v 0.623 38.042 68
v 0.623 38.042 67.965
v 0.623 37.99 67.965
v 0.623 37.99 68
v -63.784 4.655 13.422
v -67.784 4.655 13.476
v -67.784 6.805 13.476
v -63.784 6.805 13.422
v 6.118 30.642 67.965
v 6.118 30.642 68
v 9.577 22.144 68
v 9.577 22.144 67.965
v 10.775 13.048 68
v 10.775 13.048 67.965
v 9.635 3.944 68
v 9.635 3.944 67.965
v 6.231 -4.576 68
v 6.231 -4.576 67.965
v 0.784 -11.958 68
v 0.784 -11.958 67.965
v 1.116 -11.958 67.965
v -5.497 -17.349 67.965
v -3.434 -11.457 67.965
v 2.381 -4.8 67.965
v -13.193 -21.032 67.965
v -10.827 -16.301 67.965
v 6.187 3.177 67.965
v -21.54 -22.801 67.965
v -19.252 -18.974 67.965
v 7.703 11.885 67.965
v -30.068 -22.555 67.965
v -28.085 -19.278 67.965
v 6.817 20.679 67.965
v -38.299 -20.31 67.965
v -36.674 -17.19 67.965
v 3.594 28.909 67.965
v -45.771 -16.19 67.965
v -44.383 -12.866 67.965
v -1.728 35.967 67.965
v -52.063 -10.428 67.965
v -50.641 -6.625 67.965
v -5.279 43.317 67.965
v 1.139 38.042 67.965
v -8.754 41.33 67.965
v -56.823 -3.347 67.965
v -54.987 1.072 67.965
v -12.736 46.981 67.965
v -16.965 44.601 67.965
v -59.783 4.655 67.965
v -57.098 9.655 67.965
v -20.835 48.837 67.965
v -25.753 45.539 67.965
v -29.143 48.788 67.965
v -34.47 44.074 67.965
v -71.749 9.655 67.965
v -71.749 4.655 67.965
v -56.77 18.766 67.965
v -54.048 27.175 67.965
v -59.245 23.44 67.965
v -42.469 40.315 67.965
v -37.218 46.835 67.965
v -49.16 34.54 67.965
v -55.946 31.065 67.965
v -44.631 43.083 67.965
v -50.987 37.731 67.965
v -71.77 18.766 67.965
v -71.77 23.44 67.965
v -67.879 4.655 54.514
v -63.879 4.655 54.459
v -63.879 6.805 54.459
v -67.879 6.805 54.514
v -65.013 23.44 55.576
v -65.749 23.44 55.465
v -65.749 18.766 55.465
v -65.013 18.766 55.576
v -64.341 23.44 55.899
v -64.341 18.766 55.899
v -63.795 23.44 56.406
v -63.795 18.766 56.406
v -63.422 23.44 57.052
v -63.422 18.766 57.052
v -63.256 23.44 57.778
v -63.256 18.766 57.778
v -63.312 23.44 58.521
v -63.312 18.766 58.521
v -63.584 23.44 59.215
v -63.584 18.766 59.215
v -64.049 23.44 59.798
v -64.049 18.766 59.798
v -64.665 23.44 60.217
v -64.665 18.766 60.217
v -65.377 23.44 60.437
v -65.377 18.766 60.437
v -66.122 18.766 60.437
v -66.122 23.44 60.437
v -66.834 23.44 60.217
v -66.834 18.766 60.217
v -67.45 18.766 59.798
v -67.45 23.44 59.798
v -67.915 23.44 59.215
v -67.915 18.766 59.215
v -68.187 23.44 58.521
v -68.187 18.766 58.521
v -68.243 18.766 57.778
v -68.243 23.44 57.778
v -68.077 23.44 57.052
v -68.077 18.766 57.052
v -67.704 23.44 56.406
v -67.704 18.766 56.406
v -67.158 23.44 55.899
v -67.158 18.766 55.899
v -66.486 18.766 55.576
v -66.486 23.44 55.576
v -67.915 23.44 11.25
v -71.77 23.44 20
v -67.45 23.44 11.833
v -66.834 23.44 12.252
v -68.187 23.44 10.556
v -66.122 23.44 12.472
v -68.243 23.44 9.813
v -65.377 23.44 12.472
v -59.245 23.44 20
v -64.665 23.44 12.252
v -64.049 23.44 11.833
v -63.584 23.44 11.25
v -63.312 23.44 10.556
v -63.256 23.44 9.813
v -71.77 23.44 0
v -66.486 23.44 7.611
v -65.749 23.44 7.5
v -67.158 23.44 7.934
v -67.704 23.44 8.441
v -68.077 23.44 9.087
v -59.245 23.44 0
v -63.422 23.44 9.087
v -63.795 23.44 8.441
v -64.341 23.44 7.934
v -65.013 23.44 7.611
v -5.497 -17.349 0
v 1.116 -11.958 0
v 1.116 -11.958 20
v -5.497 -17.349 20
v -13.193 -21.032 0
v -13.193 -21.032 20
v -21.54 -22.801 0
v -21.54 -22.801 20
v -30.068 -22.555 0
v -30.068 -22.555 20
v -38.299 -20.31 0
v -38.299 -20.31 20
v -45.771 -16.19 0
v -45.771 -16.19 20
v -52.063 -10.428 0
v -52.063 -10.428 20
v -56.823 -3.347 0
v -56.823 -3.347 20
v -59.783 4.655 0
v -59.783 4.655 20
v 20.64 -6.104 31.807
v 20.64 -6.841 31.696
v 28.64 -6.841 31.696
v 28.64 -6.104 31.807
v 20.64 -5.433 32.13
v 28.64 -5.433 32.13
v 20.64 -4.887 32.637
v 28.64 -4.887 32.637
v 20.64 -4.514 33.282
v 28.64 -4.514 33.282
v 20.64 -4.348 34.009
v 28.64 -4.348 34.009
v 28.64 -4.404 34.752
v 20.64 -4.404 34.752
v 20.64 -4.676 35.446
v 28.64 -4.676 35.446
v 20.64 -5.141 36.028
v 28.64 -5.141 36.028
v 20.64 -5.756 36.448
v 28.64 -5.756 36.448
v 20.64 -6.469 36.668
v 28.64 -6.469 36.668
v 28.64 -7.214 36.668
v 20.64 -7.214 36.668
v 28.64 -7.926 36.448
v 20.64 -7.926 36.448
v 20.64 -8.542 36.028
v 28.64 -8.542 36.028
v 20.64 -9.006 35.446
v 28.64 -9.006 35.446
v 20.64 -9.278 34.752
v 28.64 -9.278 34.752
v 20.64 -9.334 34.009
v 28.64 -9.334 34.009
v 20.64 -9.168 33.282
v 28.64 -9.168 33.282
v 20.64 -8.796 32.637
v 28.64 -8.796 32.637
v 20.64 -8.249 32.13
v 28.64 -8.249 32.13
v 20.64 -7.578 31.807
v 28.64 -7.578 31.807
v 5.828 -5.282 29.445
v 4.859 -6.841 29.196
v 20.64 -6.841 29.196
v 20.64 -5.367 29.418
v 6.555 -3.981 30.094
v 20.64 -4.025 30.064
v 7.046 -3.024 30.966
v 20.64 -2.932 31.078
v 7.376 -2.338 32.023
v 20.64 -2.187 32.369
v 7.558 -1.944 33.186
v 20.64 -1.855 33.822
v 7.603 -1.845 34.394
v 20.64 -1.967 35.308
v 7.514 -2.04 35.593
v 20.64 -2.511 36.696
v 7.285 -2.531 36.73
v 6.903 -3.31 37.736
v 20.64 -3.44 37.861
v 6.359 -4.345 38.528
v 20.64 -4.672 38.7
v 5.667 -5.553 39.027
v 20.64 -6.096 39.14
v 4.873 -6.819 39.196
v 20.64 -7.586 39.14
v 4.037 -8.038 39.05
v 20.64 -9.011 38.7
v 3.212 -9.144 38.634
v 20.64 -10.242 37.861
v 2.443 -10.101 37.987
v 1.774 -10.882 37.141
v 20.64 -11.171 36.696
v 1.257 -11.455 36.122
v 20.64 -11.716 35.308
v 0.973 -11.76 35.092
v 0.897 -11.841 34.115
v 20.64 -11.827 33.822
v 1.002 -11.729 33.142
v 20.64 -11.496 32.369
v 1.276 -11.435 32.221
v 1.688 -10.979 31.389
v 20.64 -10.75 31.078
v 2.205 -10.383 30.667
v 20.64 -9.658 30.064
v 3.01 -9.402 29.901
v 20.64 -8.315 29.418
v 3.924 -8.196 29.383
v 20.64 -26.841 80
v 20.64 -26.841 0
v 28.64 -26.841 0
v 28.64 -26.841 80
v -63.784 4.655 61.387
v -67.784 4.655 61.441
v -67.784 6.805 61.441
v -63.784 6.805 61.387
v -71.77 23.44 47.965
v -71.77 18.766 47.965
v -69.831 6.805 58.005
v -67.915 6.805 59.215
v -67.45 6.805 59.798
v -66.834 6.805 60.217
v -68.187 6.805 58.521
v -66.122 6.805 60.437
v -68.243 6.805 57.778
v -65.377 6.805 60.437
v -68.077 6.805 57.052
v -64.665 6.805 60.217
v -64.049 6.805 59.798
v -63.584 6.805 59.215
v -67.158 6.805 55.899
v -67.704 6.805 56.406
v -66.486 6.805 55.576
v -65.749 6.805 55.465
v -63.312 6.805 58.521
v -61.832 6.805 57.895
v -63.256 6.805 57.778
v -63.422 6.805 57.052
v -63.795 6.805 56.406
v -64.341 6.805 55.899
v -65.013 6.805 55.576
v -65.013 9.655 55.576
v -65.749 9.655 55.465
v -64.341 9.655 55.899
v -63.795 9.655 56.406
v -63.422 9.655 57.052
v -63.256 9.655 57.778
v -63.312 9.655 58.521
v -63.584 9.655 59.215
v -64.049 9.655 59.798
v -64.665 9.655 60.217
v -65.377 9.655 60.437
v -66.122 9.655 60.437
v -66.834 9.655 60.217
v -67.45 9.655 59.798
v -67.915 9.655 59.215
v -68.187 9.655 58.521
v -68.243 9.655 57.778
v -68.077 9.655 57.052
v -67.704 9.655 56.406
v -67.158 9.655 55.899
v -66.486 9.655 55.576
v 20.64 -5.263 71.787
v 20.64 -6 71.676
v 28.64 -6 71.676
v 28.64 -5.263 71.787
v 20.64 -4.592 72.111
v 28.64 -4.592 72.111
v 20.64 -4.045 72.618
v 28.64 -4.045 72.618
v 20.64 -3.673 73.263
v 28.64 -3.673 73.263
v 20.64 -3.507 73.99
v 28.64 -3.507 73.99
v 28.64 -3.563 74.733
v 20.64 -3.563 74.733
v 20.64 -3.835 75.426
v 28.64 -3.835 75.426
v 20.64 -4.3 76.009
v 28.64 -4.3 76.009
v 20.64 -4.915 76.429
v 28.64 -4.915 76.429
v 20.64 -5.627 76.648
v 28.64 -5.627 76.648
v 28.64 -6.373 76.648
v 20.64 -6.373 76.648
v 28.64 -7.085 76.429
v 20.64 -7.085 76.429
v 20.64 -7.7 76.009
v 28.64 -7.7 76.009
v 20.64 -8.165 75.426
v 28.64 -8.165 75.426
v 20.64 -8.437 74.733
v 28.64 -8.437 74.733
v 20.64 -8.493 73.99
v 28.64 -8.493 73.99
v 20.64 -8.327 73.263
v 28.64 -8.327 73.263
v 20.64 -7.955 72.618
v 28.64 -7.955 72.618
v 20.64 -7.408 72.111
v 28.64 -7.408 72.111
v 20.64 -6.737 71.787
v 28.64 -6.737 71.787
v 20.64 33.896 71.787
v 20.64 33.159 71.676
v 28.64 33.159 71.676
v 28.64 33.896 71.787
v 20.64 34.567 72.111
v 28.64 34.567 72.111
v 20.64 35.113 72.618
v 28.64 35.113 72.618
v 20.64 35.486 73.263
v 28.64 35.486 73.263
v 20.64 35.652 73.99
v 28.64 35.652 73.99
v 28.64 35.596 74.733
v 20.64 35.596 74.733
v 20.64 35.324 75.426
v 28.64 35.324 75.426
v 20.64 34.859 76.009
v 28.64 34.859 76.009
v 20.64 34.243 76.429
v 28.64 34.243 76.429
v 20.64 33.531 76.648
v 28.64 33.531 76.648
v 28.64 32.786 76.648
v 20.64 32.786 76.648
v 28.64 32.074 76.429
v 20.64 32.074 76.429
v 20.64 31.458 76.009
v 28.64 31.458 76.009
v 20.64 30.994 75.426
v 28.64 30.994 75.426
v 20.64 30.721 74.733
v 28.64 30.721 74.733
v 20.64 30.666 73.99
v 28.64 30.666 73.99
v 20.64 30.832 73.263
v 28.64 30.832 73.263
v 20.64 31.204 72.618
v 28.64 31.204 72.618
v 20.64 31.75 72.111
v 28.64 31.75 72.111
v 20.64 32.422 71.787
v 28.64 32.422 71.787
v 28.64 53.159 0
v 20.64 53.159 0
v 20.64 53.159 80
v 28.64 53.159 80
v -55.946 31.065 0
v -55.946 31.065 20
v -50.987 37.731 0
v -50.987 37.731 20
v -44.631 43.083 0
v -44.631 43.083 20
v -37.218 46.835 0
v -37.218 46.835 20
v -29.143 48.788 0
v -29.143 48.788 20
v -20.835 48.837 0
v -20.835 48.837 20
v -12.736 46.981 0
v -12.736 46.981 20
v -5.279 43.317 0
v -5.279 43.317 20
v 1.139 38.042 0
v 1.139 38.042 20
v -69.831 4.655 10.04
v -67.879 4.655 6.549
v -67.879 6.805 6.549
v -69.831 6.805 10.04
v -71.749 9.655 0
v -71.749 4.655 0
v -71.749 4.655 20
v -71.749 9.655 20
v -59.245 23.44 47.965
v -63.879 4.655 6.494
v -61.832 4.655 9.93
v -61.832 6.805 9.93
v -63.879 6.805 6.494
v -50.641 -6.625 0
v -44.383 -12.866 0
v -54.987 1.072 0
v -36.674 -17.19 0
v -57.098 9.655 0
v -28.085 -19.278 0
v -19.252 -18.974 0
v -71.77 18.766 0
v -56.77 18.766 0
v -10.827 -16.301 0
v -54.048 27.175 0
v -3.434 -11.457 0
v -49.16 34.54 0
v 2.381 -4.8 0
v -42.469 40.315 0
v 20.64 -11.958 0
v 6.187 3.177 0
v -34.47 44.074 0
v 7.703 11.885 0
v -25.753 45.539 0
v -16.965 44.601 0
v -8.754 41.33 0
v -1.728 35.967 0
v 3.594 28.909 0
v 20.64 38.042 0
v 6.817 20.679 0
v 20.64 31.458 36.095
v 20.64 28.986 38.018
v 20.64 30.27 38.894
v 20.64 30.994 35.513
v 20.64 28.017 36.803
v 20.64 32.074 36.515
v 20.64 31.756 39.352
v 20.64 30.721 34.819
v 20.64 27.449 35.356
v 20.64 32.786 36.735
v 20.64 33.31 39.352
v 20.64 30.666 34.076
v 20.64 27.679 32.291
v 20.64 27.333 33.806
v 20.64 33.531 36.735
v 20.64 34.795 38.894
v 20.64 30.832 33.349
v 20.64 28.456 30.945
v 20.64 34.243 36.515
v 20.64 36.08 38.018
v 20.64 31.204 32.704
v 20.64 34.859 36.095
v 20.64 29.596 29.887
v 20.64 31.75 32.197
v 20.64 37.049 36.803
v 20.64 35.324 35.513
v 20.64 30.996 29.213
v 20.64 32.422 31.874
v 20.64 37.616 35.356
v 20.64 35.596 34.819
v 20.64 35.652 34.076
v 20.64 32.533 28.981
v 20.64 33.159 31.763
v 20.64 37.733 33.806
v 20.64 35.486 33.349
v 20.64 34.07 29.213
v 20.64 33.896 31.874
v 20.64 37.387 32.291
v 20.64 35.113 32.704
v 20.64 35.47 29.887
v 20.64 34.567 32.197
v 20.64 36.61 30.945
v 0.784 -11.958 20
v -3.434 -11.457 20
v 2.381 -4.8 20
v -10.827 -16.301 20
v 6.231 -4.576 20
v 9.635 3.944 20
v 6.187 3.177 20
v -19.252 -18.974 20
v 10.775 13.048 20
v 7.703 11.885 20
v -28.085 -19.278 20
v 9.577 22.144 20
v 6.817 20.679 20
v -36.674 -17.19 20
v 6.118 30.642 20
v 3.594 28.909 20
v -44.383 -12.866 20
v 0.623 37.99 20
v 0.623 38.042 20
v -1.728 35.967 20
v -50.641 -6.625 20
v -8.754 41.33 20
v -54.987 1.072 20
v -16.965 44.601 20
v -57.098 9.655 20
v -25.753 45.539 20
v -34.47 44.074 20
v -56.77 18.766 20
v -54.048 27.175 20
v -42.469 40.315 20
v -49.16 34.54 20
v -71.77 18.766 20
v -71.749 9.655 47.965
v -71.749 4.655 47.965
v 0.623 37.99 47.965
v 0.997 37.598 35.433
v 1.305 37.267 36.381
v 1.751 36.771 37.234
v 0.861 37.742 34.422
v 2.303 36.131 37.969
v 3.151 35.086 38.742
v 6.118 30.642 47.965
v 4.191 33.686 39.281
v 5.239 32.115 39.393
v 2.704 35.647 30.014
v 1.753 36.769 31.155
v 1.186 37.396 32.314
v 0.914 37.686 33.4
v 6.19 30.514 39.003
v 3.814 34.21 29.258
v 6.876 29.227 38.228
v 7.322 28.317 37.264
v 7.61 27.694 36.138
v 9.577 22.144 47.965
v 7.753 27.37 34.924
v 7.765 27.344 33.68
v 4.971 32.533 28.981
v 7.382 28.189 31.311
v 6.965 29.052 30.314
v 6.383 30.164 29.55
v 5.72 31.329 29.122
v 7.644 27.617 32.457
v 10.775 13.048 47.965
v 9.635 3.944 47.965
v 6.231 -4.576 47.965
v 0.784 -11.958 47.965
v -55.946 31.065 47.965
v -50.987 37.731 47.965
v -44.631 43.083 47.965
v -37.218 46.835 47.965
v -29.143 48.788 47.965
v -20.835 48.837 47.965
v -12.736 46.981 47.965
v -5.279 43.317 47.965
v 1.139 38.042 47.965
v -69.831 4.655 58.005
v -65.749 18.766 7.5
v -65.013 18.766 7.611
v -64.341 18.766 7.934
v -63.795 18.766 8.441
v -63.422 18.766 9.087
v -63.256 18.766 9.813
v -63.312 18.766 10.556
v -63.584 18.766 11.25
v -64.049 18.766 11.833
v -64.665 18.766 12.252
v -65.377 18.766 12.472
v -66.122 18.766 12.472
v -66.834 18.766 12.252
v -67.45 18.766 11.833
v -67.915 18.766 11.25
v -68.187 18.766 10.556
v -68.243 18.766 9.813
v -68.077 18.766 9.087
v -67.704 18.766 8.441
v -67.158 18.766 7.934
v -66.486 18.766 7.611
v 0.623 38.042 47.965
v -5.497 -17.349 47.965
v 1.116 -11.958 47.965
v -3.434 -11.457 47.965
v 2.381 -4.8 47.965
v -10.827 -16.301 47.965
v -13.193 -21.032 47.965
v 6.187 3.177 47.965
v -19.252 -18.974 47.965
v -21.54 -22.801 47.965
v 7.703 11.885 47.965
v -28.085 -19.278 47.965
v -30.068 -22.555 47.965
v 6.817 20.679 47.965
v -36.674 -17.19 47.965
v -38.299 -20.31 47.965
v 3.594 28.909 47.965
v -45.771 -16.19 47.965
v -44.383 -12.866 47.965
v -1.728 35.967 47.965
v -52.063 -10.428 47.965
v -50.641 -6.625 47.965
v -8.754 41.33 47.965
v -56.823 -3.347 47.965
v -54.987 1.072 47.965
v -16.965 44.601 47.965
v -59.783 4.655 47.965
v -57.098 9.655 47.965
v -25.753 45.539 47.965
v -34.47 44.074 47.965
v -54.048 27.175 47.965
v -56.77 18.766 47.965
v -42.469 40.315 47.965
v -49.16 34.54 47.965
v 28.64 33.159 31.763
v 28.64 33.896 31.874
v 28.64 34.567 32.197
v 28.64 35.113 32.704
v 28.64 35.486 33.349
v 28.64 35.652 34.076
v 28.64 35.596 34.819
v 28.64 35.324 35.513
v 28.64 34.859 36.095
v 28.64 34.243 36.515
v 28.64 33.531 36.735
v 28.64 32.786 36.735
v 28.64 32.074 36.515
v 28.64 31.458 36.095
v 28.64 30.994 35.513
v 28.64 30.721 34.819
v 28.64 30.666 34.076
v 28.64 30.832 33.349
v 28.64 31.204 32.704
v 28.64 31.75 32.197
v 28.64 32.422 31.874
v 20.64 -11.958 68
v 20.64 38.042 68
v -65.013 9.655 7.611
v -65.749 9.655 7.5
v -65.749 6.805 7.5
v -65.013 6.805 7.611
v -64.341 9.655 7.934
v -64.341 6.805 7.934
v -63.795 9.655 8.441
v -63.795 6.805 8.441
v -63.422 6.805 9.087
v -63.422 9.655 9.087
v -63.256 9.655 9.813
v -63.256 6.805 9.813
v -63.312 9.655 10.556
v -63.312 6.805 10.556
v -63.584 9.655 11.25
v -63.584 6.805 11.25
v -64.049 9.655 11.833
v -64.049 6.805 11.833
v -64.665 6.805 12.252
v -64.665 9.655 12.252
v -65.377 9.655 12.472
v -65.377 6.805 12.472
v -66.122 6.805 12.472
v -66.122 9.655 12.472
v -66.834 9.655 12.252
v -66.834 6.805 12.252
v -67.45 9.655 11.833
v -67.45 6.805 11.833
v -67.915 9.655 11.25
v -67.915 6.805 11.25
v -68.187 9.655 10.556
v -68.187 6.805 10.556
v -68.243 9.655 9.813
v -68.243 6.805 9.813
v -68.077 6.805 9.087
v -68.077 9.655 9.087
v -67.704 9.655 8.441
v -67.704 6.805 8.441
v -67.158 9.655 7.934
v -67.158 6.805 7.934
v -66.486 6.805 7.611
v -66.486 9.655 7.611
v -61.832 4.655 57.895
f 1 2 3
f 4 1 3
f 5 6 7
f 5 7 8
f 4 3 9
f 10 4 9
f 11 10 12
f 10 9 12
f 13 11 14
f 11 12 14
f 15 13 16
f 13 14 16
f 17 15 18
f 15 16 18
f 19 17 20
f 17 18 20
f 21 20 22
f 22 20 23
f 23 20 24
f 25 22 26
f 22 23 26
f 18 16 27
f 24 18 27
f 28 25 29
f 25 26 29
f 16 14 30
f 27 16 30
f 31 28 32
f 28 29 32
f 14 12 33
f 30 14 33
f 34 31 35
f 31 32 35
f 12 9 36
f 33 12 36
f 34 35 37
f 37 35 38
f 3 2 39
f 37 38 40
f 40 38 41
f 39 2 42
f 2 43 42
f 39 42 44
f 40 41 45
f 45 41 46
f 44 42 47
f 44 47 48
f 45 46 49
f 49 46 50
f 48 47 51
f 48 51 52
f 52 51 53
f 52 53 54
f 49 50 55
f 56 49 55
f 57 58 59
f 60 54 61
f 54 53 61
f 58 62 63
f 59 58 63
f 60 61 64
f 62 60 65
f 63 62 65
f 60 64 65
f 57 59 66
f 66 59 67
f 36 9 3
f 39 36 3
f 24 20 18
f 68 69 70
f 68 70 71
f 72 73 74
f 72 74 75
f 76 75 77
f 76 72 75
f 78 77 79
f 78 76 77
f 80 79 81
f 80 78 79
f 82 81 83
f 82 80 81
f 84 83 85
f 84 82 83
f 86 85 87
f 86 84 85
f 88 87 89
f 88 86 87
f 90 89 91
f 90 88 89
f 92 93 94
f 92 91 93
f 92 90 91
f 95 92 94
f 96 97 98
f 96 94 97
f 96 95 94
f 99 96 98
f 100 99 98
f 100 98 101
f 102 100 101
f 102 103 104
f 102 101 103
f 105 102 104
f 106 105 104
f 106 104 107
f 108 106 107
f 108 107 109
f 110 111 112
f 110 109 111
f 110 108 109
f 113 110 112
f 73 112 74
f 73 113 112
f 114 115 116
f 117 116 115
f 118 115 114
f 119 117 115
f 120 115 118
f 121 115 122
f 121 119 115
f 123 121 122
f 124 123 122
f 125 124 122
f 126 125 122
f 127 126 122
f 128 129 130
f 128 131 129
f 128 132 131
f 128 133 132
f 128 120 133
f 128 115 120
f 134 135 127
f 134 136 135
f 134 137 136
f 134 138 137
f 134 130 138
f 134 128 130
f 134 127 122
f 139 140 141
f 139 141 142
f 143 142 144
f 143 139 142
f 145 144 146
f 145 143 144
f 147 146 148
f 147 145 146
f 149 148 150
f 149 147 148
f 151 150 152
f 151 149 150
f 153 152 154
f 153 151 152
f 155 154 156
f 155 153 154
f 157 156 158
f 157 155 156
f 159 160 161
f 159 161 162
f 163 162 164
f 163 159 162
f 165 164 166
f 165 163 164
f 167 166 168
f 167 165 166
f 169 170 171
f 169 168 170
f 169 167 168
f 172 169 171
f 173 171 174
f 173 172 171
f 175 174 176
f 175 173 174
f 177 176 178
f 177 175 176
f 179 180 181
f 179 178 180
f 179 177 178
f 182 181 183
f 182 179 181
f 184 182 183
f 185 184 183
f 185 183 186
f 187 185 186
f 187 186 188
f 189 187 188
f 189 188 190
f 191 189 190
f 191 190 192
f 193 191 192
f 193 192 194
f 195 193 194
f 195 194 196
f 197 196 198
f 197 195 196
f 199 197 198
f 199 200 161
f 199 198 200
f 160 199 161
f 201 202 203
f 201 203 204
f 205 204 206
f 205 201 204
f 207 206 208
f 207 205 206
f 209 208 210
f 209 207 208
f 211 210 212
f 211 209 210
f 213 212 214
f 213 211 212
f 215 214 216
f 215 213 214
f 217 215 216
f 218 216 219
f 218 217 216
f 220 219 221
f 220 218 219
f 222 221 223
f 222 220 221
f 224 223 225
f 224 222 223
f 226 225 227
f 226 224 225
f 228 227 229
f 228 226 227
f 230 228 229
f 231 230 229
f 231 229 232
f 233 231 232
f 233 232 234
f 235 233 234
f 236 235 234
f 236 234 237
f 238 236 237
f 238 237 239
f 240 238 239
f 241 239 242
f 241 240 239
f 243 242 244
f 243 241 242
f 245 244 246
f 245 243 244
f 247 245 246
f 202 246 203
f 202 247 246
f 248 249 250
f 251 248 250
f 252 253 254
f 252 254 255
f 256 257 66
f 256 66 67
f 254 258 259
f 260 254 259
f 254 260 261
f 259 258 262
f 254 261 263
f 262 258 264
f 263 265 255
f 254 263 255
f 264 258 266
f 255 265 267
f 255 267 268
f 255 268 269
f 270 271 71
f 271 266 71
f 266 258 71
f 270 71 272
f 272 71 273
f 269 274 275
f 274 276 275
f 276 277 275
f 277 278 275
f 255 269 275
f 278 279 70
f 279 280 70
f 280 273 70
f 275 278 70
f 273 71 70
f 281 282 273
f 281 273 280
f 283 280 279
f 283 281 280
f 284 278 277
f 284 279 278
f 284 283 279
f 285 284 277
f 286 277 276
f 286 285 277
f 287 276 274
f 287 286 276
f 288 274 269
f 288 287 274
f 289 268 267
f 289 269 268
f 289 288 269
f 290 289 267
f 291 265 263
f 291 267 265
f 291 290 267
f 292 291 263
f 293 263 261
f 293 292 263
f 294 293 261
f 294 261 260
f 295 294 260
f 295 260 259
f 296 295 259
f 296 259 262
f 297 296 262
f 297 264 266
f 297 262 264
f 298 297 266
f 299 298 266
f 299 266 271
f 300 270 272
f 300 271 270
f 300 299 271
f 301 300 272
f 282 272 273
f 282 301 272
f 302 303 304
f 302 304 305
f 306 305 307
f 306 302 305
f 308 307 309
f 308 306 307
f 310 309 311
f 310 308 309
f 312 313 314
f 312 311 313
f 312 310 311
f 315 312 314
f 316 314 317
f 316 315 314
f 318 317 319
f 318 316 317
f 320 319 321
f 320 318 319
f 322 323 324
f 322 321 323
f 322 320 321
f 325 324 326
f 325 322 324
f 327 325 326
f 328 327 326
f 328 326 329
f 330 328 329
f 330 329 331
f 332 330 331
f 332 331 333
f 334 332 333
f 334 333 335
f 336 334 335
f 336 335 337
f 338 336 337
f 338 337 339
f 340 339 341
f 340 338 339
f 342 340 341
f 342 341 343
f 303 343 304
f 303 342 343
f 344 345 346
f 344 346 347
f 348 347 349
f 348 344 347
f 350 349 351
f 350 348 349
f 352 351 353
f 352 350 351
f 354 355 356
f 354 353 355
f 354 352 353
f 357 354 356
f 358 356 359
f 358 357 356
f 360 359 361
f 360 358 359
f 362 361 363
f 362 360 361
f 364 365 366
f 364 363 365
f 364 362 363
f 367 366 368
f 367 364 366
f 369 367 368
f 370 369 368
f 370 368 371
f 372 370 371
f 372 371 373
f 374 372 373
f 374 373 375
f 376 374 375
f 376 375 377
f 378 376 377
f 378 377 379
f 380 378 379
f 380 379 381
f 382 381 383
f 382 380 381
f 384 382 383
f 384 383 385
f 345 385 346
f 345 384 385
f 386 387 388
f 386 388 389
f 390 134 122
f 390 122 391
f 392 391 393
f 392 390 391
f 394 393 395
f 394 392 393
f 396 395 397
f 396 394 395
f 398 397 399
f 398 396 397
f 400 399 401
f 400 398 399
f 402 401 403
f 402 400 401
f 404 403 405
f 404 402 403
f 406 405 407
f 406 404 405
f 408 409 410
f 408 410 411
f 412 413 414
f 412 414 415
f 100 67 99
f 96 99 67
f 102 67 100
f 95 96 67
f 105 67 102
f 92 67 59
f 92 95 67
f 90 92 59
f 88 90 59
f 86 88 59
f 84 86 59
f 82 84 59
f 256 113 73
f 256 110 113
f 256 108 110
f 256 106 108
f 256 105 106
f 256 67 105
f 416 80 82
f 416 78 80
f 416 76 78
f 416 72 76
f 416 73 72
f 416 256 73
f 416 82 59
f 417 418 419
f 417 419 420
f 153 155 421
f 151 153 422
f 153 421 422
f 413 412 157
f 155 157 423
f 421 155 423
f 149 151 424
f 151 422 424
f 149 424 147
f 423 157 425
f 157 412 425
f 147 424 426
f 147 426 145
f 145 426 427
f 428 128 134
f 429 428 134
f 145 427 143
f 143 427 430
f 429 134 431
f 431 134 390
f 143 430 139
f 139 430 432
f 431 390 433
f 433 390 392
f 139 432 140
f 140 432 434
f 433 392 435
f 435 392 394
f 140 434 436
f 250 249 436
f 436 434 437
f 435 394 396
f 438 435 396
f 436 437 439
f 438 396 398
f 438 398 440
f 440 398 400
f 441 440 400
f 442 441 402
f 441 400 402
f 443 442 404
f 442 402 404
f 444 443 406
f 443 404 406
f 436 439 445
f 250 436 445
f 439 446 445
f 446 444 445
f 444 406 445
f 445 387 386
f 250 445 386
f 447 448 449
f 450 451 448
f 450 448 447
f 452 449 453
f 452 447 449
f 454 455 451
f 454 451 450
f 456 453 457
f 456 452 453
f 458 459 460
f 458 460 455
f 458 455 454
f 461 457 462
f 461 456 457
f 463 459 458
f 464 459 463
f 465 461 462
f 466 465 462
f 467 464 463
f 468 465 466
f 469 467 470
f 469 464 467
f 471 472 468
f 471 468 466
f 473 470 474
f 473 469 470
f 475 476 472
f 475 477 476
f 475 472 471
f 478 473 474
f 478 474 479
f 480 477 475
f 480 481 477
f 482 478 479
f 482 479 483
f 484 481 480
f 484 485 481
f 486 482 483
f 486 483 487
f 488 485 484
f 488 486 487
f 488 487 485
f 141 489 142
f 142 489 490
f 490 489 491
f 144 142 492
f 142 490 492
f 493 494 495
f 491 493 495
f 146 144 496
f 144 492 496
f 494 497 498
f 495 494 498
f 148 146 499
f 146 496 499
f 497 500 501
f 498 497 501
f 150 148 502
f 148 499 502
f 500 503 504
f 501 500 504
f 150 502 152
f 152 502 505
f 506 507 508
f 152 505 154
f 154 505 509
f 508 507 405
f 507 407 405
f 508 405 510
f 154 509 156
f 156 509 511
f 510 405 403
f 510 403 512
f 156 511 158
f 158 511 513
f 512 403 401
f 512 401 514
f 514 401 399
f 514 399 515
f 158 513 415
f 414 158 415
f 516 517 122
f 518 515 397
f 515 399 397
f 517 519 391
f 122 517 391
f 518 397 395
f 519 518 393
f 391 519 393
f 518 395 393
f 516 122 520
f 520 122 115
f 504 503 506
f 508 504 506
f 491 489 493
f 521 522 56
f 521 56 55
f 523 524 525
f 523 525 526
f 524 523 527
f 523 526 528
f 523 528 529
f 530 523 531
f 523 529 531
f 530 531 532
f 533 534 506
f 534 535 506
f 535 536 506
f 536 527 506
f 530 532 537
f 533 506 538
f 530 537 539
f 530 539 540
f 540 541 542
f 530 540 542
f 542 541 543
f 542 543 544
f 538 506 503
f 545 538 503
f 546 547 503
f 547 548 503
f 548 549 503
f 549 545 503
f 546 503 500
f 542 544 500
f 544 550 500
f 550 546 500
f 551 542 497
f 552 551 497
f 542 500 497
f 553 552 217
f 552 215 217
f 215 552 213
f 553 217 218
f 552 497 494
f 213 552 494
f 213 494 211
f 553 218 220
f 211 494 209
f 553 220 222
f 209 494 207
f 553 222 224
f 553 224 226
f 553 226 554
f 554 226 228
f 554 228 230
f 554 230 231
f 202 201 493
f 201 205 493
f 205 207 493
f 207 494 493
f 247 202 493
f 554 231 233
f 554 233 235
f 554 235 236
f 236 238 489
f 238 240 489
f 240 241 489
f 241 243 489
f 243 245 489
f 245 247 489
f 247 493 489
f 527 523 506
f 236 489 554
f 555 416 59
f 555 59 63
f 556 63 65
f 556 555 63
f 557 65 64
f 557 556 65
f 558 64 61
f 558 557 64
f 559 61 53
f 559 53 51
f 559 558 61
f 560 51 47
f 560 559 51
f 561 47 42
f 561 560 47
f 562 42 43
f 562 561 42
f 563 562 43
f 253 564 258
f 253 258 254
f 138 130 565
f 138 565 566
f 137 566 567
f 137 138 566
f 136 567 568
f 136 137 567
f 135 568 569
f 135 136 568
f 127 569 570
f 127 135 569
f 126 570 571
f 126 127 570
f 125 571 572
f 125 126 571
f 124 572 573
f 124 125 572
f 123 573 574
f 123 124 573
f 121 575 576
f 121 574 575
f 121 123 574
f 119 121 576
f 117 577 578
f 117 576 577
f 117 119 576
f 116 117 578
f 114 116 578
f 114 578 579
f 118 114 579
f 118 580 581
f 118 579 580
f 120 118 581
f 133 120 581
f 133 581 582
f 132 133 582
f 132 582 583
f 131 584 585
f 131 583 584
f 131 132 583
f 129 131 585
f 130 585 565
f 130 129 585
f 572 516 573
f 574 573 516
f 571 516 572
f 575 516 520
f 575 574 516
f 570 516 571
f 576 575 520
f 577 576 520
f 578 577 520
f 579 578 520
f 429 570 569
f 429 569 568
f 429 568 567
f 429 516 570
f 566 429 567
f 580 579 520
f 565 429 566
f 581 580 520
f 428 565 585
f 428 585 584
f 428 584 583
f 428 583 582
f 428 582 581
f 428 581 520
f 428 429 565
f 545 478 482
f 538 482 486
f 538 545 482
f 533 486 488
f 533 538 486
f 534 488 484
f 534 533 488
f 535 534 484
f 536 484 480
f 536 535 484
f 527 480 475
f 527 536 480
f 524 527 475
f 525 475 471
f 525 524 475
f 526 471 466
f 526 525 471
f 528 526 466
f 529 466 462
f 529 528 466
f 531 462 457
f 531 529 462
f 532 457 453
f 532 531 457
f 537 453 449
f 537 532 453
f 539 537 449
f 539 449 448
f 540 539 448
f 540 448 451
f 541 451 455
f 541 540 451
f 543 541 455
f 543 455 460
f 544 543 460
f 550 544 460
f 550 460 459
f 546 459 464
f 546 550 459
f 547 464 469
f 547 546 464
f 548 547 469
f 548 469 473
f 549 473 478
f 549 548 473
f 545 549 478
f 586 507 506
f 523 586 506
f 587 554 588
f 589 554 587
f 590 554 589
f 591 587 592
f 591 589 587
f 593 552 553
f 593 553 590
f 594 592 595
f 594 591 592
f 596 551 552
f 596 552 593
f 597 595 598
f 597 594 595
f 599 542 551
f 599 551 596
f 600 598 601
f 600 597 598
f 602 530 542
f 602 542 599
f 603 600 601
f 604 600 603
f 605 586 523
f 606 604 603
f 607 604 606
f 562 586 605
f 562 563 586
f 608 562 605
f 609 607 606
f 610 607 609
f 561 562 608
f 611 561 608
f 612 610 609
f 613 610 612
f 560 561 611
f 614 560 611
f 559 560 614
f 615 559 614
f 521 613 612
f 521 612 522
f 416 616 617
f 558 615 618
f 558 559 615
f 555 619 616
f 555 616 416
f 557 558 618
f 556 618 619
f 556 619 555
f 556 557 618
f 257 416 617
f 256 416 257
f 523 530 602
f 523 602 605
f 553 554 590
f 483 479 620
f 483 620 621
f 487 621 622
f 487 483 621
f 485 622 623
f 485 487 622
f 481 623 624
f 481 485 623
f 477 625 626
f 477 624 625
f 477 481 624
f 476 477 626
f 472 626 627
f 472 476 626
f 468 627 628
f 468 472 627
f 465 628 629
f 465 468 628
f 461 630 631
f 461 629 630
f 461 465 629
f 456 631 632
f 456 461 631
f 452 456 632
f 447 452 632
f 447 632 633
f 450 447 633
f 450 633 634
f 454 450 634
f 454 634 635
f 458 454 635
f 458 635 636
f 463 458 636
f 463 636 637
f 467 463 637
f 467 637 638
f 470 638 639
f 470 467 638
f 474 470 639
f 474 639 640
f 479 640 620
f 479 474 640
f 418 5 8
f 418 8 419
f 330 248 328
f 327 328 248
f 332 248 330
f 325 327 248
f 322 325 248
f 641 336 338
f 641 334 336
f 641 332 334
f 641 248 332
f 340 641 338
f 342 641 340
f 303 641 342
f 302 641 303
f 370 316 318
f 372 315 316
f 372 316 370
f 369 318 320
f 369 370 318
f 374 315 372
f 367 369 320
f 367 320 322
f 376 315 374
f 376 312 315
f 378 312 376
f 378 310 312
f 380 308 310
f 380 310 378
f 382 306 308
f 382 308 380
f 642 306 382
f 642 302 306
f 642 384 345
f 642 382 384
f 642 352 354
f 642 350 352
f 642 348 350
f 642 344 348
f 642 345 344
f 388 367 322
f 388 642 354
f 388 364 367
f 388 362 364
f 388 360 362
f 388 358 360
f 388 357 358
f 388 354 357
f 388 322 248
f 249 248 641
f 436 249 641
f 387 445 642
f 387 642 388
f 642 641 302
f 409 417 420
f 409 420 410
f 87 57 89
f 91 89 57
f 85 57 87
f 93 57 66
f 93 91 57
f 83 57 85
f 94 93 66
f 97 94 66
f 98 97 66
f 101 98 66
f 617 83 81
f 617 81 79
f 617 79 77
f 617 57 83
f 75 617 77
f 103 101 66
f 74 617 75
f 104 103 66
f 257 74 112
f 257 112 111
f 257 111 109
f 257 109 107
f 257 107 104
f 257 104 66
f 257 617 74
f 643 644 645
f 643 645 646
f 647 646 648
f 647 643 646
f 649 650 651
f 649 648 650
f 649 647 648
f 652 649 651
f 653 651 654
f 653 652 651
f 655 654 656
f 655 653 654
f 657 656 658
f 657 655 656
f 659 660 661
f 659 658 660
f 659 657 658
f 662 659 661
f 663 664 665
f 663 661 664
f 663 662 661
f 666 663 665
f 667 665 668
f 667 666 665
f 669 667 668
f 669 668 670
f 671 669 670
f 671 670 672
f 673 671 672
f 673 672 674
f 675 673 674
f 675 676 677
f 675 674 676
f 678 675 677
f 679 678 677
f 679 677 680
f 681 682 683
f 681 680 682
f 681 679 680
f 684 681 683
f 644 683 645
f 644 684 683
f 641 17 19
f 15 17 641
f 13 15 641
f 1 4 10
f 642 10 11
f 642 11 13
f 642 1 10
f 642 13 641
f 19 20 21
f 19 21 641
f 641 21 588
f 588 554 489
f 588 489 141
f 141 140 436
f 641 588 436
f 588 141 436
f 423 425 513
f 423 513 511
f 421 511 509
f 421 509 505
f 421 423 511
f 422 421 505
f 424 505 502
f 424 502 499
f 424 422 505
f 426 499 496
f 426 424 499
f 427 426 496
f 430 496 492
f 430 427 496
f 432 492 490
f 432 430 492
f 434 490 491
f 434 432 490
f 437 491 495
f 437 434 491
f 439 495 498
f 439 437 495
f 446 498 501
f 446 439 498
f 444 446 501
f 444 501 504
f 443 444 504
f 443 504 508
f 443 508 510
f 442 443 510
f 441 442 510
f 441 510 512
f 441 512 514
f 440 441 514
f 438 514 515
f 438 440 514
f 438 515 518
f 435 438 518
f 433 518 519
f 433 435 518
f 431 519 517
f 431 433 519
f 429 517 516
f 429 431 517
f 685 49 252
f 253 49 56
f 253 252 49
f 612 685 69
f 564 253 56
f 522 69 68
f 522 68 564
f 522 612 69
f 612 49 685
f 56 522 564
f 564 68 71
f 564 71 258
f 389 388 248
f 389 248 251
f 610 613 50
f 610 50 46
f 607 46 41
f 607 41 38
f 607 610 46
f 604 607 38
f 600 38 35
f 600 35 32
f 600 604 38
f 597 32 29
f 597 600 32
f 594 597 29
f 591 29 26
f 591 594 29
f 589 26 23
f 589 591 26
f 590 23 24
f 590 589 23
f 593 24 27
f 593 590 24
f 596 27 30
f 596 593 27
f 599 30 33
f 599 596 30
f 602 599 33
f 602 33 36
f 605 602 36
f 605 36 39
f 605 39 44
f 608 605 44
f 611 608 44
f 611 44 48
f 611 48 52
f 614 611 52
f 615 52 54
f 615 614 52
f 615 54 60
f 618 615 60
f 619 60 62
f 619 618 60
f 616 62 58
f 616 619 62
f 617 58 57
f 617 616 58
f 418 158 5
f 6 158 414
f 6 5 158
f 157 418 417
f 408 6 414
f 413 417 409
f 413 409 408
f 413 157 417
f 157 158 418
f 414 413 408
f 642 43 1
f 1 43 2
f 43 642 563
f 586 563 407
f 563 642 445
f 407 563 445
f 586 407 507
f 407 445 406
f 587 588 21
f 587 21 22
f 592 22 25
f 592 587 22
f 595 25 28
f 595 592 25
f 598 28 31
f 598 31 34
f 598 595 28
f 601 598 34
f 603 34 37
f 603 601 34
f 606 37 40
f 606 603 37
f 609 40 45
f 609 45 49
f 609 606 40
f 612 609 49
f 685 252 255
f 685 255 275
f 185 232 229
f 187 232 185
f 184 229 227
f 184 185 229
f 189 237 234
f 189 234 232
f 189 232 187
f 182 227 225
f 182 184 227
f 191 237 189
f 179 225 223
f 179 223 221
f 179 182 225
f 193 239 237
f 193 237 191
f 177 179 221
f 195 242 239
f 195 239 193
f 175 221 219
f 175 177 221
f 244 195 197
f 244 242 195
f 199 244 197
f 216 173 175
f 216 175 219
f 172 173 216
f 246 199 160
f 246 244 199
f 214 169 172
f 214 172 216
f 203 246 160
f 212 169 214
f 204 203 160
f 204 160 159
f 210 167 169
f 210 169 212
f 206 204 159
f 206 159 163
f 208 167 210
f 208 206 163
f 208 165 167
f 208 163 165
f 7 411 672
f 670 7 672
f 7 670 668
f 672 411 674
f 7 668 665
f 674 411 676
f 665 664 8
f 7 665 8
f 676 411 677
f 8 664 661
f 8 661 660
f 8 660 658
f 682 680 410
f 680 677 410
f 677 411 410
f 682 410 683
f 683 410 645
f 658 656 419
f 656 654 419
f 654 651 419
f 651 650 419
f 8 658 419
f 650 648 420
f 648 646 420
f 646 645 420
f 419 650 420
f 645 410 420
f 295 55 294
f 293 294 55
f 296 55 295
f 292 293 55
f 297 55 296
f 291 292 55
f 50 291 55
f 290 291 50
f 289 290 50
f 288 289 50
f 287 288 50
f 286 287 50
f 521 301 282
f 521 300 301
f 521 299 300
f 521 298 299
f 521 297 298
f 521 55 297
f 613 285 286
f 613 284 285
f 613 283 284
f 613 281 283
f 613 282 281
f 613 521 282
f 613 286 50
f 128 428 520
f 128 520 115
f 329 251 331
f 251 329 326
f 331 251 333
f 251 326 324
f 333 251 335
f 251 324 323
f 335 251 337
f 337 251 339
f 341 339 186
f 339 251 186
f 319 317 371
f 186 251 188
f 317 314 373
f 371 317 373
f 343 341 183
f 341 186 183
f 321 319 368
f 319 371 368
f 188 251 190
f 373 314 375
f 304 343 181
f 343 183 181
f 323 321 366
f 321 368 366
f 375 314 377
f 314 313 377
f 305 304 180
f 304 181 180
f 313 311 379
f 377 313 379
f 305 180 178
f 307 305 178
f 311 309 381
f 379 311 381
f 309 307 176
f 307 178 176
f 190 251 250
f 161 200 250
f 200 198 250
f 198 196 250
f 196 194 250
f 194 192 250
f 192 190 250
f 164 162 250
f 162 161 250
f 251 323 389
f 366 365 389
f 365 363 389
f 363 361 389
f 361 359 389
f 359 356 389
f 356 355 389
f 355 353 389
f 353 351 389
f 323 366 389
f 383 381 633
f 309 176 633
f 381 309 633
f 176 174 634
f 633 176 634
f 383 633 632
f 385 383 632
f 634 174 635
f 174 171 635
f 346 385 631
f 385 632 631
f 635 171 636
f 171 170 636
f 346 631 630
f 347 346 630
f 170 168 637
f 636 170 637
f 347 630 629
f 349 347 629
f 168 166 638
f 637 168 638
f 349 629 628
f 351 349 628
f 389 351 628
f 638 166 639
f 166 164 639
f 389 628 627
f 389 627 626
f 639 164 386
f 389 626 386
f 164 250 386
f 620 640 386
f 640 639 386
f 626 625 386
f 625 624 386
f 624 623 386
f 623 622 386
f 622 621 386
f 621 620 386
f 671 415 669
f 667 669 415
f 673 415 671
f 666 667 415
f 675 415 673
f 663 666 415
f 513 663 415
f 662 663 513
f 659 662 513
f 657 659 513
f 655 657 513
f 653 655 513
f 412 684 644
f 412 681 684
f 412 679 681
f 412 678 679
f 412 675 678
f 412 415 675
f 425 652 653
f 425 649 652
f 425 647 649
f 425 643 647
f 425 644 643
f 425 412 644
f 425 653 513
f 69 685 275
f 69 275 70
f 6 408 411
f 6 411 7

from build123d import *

# Parameters (mm, degrees)
BOSS_EXTRU_2_DEPTH         = 20
BOSS_EXTRU_4_DEPTH         = 2.2401
BOSS_EXTRU_4_DEPTH_BACK    = 20
ESQUISSE3_R                = 2.5
BOSS_EXTRU_7_DEPTH         = 6.805036811
BOSS_EXTRU_7_DEPTH_BACK    = 0.2
ESQUISSE13_W               = 8
ESQUISSE13_H               = 80
BOSS_EXTRU_9_DEPTH         = 80
BOSS_EXTRU_11_DEPTH        = 40
BOSS_EXTRU_11_DEPTH_BACK   = 3.5598
ESQUISSE16_R               = 2.5
BOSS_EXTRU_11_2_DEPTH      = 40
BOSS_EXTRU_11_2_DEPTH_BACK = 3.5598
BOSS_EXTRU_11_3_DEPTH      = 40
BOSS_EXTRU_11_3_DEPTH_BACK = 3.5598
BOSS_EXTRU_11_4_DEPTH      = 40
BOSS_EXTRU_11_4_DEPTH_BACK = 3.5598
BOSS_EXTRU_12_DEPTH        = 68
ESQUISSE19_R               = 5.214324904
BOSS_EXTRU_15_DEPTH        = 21.55
ESQUISSE19_R_2             = 5
BOSS_EXTRU_15_2_DEPTH      = 21.55


with BuildPart() as part:
    # Esquisse1 → Boss.-Extru.2 (new body)
    with BuildSketch(Plane.XY):
        with BuildLine():
            Line((-71.273833315, 9.654910047), (-56.622475708, 9.654910047))
            ThreePointArc((-56.622475708, 9.654910047), (8.178325953, 11.885050452), (-56.29470269, 18.765893404))
            Line((-56.29470269, 18.765893404), (-71.29470269, 18.765893404))
            Line((-71.29470269, 18.765893404), (-71.29470269, 23.440192667))
            Line((-71.29470269, 23.440192667), (-58.769730896, 23.440192667))
            ThreePointArc((-58.769730896, 23.440192667), (11.684606541, 12.02375525), (-59.307286147, 4.654910047))
            Line((-59.307286147, 4.654910047), (-71.273833315, 4.654910047))
            Line((-71.273833315, 4.654910047), (-71.273833315, 9.654910047))
        make_face()
    extrude(amount=BOSS_EXTRU_2_DEPTH)


with BuildPart() as body_2:
    # Esquisse3 → Boss.-Extru.4 (new, two sides: drawn at the far end of the back side and taken through both)
    with BuildSketch(Plane(origin=(11.50882306, 4.654910047, -20.756809104), x_dir=(-1, 0, 0), z_dir=(0, -1, 0)).offset(-BOSS_EXTRU_4_DEPTH_BACK)):
        with Locations(Location((76.783055813, -30.756809104, 0), (0, 0, 90))):
            Circle(ESQUISSE3_R)
    extrude(amount=BOSS_EXTRU_4_DEPTH + BOSS_EXTRU_4_DEPTH_BACK)


with BuildPart() as body_3:
    # Esquisse8 → Boss.-Extru.7 (new, two sides: drawn at the far end of the back side and taken through both)
    with BuildSketch(Plane(origin=(38.166060495, 0, 0), x_dir=(1, 0, 0), z_dir=(0, 1, 0)).offset(-BOSS_EXTRU_7_DEPTH_BACK)):
        Polygon((-101.475254656, -13.421592672), (-99.52284996, -9.930444451), (-101.570070661, -6.494038275), (-105.569696057, -6.548780321), (-107.522100752, -10.039928543), (-105.474880052, -13.476334718), align=None)
    extrude(amount=BOSS_EXTRU_7_DEPTH + BOSS_EXTRU_7_DEPTH_BACK)


with BuildPart() as part_1:
    add(part.part)

    # Combiner2: cut body 2, body 3
    add(body_2.part, mode=Mode.SUBTRACT)
    add(body_3.part, mode=Mode.SUBTRACT)


with BuildPart() as body_2_2:
    # Corps-Déplacer/Copier2: copy of part
    add(part_1.part.moved(Location((0, 0, 72.964959744))))


with BuildPart() as body_3_2:
    # Esquisse13 → Boss.-Extru.9 (new body)
    with BuildSketch(Plane.XY):
        with Locations((26.041295444, 19.15878473)):
            Rectangle(ESQUISSE13_W, ESQUISSE13_H)
    extrude(amount=BOSS_EXTRU_9_DEPTH)


with BuildPart() as body_2_2_1:
    # Corps-Déplacer/Copier3: moved
    add(body_2_2.part.moved(Location((0, 0, -25))))


with BuildPart() as body_4:
    # Esquisse16 → Boss.-Extru.11 (new, two sides: drawn at the far end of the back side and taken through both)
    with BuildSketch(Plane(origin=(0, 0, 0), x_dir=(0, 0, -1), z_dir=(1, 0, 0)).offset(-BOSS_EXTRU_11_DEPTH_BACK)):
        with Locations((-34.262679566, 39.15878473)):
            Circle(ESQUISSE16_R)
    extrude(amount=BOSS_EXTRU_11_DEPTH + BOSS_EXTRU_11_DEPTH_BACK)


with BuildPart() as body_5:
    # Esquisse16 → Boss.-Extru.11 2 (new, two sides: drawn at the far end of the back side and taken through both)
    with BuildSketch(Plane(origin=(0, 0, 0), x_dir=(0, 0, -1), z_dir=(1, 0, 0)).offset(-BOSS_EXTRU_11_2_DEPTH_BACK)):
        with Locations((-34.195620058, -0.841159058)):
            Circle(ESQUISSE16_R)
    extrude(amount=BOSS_EXTRU_11_2_DEPTH + BOSS_EXTRU_11_2_DEPTH_BACK)


with BuildPart() as body_6:
    # Esquisse16 → Boss.-Extru.11 3 (new, two sides: drawn at the far end of the back side and taken through both)
    with BuildSketch(Plane(origin=(0, 0, 0), x_dir=(0, 0, -1), z_dir=(1, 0, 0)).offset(-BOSS_EXTRU_11_3_DEPTH_BACK)):
        with Locations((-74.176398553, 0)):
            Circle(ESQUISSE16_R)
    extrude(amount=BOSS_EXTRU_11_3_DEPTH + BOSS_EXTRU_11_3_DEPTH_BACK)


with BuildPart() as body_7:
    # Esquisse16 → Boss.-Extru.11 4 (new, two sides: drawn at the far end of the back side and taken through both)
    with BuildSketch(Plane(origin=(0, 0, 0), x_dir=(0, 0, -1), z_dir=(1, 0, 0)).offset(-BOSS_EXTRU_11_4_DEPTH_BACK)):
        with Locations((-74.176398553, 39.15878473)):
            Circle(ESQUISSE16_R)
    extrude(amount=BOSS_EXTRU_11_4_DEPTH + BOSS_EXTRU_11_4_DEPTH_BACK)


with BuildPart() as body_3_2_1:
    add(body_3_2.part)

    # Combiner3: cut body 7, body 4, body 6, body 5
    add(body_7.part, mode=Mode.SUBTRACT)
    add(body_4.part, mode=Mode.SUBTRACT)
    add(body_6.part, mode=Mode.SUBTRACT)
    add(body_5.part, mode=Mode.SUBTRACT)


with BuildPart() as part_2:
    add(part_1.part)

    add(body_2_2_1.part)  # Boss.-Extru.12 merges body 2 2
    # Esquisse17 → Boss.-Extru.12 (add)
    with BuildSketch(Plane.XY):
        with BuildLine():
            Line((21.259619395, 38.041540738), (1.098292972, 38.041540738))
            Line((1.098292972, 38.041540738), (1.098292972, 37.989779899))
            ThreePointArc((1.098292972, 37.989779899), (11.250408812, 13.048189822), (1.259619395, -11.958459262))
            Line((1.259619395, -11.958459262), (21.259619395, -11.958459262))
            Line((21.259619395, -11.958459262), (21.259619395, 38.041540738))
        make_face()
    extrude(amount=BOSS_EXTRU_12_DEPTH)


with BuildPart() as body_3_2_2:
    # Corps-Déplacer/Copier4: moved
    add(body_3_2_1.part.moved(Location((0, -10, 0))))


with BuildPart() as body_3_2_3:
    # Corps-Déplacer/Copier5: moved
    add(body_3_2_2.part.moved(Location((0, 5, 0))))


with BuildPart() as body_3_2_4:
    # Corps-Déplacer/Copier6: moved
    add(body_3_2_3.part.moved(Location((0, -1, 0))))


with BuildPart() as body_3_2_5:
    # Corps-Déplacer/Copier7: moved
    add(body_3_2_4.part.moved(Location((57.599184588, 0, 0))))


with BuildPart() as part_3:
    # Corps-Déplacer/Copier8: moved
    add(part_2.part.moved(Location((-92, 0, 0))))


with BuildPart() as body_3_3:
    # Esquisse19 → Boss.-Extru.15 (new body)
    with BuildSketch(Plane(origin=(0, 0, 0), x_dir=(0, 0, -1), z_dir=(1, 0, 0))):
        with Locations((-34.195620058, 32.532899017)):
            Circle(ESQUISSE19_R)
    extrude(amount=BOSS_EXTRU_15_DEPTH)


with BuildPart() as body_4_2:
    # Esquisse19 → Boss.-Extru.15 2 (new body)
    with BuildSketch(Plane(origin=(0, 0, 0), x_dir=(0, 0, -1), z_dir=(1, 0, 0))):
        with Locations((-34.195620058, -6.841159058)):
            Circle(ESQUISSE19_R_2)
    extrude(amount=BOSS_EXTRU_15_2_DEPTH)


with BuildPart() as part_4:
    # Corps-Déplacer/Copier9: moved
    add(part_3.part.moved(Location((91.524740037, 0, 0))))

    # Combiner6: cut body 3 3, body 4 2
    add(body_3_3.part, mode=Mode.SUBTRACT)
    add(body_4_2.part, mode=Mode.SUBTRACT)


with BuildPart() as body_3_2_6:
    # Corps-Déplacer/Copier12: moved
    add(body_3_2_5.part.moved(Location((-59, 0, 0))))

    # Combiner7: union part
    add(part_4.part)


solid = body_3_2_6.part
